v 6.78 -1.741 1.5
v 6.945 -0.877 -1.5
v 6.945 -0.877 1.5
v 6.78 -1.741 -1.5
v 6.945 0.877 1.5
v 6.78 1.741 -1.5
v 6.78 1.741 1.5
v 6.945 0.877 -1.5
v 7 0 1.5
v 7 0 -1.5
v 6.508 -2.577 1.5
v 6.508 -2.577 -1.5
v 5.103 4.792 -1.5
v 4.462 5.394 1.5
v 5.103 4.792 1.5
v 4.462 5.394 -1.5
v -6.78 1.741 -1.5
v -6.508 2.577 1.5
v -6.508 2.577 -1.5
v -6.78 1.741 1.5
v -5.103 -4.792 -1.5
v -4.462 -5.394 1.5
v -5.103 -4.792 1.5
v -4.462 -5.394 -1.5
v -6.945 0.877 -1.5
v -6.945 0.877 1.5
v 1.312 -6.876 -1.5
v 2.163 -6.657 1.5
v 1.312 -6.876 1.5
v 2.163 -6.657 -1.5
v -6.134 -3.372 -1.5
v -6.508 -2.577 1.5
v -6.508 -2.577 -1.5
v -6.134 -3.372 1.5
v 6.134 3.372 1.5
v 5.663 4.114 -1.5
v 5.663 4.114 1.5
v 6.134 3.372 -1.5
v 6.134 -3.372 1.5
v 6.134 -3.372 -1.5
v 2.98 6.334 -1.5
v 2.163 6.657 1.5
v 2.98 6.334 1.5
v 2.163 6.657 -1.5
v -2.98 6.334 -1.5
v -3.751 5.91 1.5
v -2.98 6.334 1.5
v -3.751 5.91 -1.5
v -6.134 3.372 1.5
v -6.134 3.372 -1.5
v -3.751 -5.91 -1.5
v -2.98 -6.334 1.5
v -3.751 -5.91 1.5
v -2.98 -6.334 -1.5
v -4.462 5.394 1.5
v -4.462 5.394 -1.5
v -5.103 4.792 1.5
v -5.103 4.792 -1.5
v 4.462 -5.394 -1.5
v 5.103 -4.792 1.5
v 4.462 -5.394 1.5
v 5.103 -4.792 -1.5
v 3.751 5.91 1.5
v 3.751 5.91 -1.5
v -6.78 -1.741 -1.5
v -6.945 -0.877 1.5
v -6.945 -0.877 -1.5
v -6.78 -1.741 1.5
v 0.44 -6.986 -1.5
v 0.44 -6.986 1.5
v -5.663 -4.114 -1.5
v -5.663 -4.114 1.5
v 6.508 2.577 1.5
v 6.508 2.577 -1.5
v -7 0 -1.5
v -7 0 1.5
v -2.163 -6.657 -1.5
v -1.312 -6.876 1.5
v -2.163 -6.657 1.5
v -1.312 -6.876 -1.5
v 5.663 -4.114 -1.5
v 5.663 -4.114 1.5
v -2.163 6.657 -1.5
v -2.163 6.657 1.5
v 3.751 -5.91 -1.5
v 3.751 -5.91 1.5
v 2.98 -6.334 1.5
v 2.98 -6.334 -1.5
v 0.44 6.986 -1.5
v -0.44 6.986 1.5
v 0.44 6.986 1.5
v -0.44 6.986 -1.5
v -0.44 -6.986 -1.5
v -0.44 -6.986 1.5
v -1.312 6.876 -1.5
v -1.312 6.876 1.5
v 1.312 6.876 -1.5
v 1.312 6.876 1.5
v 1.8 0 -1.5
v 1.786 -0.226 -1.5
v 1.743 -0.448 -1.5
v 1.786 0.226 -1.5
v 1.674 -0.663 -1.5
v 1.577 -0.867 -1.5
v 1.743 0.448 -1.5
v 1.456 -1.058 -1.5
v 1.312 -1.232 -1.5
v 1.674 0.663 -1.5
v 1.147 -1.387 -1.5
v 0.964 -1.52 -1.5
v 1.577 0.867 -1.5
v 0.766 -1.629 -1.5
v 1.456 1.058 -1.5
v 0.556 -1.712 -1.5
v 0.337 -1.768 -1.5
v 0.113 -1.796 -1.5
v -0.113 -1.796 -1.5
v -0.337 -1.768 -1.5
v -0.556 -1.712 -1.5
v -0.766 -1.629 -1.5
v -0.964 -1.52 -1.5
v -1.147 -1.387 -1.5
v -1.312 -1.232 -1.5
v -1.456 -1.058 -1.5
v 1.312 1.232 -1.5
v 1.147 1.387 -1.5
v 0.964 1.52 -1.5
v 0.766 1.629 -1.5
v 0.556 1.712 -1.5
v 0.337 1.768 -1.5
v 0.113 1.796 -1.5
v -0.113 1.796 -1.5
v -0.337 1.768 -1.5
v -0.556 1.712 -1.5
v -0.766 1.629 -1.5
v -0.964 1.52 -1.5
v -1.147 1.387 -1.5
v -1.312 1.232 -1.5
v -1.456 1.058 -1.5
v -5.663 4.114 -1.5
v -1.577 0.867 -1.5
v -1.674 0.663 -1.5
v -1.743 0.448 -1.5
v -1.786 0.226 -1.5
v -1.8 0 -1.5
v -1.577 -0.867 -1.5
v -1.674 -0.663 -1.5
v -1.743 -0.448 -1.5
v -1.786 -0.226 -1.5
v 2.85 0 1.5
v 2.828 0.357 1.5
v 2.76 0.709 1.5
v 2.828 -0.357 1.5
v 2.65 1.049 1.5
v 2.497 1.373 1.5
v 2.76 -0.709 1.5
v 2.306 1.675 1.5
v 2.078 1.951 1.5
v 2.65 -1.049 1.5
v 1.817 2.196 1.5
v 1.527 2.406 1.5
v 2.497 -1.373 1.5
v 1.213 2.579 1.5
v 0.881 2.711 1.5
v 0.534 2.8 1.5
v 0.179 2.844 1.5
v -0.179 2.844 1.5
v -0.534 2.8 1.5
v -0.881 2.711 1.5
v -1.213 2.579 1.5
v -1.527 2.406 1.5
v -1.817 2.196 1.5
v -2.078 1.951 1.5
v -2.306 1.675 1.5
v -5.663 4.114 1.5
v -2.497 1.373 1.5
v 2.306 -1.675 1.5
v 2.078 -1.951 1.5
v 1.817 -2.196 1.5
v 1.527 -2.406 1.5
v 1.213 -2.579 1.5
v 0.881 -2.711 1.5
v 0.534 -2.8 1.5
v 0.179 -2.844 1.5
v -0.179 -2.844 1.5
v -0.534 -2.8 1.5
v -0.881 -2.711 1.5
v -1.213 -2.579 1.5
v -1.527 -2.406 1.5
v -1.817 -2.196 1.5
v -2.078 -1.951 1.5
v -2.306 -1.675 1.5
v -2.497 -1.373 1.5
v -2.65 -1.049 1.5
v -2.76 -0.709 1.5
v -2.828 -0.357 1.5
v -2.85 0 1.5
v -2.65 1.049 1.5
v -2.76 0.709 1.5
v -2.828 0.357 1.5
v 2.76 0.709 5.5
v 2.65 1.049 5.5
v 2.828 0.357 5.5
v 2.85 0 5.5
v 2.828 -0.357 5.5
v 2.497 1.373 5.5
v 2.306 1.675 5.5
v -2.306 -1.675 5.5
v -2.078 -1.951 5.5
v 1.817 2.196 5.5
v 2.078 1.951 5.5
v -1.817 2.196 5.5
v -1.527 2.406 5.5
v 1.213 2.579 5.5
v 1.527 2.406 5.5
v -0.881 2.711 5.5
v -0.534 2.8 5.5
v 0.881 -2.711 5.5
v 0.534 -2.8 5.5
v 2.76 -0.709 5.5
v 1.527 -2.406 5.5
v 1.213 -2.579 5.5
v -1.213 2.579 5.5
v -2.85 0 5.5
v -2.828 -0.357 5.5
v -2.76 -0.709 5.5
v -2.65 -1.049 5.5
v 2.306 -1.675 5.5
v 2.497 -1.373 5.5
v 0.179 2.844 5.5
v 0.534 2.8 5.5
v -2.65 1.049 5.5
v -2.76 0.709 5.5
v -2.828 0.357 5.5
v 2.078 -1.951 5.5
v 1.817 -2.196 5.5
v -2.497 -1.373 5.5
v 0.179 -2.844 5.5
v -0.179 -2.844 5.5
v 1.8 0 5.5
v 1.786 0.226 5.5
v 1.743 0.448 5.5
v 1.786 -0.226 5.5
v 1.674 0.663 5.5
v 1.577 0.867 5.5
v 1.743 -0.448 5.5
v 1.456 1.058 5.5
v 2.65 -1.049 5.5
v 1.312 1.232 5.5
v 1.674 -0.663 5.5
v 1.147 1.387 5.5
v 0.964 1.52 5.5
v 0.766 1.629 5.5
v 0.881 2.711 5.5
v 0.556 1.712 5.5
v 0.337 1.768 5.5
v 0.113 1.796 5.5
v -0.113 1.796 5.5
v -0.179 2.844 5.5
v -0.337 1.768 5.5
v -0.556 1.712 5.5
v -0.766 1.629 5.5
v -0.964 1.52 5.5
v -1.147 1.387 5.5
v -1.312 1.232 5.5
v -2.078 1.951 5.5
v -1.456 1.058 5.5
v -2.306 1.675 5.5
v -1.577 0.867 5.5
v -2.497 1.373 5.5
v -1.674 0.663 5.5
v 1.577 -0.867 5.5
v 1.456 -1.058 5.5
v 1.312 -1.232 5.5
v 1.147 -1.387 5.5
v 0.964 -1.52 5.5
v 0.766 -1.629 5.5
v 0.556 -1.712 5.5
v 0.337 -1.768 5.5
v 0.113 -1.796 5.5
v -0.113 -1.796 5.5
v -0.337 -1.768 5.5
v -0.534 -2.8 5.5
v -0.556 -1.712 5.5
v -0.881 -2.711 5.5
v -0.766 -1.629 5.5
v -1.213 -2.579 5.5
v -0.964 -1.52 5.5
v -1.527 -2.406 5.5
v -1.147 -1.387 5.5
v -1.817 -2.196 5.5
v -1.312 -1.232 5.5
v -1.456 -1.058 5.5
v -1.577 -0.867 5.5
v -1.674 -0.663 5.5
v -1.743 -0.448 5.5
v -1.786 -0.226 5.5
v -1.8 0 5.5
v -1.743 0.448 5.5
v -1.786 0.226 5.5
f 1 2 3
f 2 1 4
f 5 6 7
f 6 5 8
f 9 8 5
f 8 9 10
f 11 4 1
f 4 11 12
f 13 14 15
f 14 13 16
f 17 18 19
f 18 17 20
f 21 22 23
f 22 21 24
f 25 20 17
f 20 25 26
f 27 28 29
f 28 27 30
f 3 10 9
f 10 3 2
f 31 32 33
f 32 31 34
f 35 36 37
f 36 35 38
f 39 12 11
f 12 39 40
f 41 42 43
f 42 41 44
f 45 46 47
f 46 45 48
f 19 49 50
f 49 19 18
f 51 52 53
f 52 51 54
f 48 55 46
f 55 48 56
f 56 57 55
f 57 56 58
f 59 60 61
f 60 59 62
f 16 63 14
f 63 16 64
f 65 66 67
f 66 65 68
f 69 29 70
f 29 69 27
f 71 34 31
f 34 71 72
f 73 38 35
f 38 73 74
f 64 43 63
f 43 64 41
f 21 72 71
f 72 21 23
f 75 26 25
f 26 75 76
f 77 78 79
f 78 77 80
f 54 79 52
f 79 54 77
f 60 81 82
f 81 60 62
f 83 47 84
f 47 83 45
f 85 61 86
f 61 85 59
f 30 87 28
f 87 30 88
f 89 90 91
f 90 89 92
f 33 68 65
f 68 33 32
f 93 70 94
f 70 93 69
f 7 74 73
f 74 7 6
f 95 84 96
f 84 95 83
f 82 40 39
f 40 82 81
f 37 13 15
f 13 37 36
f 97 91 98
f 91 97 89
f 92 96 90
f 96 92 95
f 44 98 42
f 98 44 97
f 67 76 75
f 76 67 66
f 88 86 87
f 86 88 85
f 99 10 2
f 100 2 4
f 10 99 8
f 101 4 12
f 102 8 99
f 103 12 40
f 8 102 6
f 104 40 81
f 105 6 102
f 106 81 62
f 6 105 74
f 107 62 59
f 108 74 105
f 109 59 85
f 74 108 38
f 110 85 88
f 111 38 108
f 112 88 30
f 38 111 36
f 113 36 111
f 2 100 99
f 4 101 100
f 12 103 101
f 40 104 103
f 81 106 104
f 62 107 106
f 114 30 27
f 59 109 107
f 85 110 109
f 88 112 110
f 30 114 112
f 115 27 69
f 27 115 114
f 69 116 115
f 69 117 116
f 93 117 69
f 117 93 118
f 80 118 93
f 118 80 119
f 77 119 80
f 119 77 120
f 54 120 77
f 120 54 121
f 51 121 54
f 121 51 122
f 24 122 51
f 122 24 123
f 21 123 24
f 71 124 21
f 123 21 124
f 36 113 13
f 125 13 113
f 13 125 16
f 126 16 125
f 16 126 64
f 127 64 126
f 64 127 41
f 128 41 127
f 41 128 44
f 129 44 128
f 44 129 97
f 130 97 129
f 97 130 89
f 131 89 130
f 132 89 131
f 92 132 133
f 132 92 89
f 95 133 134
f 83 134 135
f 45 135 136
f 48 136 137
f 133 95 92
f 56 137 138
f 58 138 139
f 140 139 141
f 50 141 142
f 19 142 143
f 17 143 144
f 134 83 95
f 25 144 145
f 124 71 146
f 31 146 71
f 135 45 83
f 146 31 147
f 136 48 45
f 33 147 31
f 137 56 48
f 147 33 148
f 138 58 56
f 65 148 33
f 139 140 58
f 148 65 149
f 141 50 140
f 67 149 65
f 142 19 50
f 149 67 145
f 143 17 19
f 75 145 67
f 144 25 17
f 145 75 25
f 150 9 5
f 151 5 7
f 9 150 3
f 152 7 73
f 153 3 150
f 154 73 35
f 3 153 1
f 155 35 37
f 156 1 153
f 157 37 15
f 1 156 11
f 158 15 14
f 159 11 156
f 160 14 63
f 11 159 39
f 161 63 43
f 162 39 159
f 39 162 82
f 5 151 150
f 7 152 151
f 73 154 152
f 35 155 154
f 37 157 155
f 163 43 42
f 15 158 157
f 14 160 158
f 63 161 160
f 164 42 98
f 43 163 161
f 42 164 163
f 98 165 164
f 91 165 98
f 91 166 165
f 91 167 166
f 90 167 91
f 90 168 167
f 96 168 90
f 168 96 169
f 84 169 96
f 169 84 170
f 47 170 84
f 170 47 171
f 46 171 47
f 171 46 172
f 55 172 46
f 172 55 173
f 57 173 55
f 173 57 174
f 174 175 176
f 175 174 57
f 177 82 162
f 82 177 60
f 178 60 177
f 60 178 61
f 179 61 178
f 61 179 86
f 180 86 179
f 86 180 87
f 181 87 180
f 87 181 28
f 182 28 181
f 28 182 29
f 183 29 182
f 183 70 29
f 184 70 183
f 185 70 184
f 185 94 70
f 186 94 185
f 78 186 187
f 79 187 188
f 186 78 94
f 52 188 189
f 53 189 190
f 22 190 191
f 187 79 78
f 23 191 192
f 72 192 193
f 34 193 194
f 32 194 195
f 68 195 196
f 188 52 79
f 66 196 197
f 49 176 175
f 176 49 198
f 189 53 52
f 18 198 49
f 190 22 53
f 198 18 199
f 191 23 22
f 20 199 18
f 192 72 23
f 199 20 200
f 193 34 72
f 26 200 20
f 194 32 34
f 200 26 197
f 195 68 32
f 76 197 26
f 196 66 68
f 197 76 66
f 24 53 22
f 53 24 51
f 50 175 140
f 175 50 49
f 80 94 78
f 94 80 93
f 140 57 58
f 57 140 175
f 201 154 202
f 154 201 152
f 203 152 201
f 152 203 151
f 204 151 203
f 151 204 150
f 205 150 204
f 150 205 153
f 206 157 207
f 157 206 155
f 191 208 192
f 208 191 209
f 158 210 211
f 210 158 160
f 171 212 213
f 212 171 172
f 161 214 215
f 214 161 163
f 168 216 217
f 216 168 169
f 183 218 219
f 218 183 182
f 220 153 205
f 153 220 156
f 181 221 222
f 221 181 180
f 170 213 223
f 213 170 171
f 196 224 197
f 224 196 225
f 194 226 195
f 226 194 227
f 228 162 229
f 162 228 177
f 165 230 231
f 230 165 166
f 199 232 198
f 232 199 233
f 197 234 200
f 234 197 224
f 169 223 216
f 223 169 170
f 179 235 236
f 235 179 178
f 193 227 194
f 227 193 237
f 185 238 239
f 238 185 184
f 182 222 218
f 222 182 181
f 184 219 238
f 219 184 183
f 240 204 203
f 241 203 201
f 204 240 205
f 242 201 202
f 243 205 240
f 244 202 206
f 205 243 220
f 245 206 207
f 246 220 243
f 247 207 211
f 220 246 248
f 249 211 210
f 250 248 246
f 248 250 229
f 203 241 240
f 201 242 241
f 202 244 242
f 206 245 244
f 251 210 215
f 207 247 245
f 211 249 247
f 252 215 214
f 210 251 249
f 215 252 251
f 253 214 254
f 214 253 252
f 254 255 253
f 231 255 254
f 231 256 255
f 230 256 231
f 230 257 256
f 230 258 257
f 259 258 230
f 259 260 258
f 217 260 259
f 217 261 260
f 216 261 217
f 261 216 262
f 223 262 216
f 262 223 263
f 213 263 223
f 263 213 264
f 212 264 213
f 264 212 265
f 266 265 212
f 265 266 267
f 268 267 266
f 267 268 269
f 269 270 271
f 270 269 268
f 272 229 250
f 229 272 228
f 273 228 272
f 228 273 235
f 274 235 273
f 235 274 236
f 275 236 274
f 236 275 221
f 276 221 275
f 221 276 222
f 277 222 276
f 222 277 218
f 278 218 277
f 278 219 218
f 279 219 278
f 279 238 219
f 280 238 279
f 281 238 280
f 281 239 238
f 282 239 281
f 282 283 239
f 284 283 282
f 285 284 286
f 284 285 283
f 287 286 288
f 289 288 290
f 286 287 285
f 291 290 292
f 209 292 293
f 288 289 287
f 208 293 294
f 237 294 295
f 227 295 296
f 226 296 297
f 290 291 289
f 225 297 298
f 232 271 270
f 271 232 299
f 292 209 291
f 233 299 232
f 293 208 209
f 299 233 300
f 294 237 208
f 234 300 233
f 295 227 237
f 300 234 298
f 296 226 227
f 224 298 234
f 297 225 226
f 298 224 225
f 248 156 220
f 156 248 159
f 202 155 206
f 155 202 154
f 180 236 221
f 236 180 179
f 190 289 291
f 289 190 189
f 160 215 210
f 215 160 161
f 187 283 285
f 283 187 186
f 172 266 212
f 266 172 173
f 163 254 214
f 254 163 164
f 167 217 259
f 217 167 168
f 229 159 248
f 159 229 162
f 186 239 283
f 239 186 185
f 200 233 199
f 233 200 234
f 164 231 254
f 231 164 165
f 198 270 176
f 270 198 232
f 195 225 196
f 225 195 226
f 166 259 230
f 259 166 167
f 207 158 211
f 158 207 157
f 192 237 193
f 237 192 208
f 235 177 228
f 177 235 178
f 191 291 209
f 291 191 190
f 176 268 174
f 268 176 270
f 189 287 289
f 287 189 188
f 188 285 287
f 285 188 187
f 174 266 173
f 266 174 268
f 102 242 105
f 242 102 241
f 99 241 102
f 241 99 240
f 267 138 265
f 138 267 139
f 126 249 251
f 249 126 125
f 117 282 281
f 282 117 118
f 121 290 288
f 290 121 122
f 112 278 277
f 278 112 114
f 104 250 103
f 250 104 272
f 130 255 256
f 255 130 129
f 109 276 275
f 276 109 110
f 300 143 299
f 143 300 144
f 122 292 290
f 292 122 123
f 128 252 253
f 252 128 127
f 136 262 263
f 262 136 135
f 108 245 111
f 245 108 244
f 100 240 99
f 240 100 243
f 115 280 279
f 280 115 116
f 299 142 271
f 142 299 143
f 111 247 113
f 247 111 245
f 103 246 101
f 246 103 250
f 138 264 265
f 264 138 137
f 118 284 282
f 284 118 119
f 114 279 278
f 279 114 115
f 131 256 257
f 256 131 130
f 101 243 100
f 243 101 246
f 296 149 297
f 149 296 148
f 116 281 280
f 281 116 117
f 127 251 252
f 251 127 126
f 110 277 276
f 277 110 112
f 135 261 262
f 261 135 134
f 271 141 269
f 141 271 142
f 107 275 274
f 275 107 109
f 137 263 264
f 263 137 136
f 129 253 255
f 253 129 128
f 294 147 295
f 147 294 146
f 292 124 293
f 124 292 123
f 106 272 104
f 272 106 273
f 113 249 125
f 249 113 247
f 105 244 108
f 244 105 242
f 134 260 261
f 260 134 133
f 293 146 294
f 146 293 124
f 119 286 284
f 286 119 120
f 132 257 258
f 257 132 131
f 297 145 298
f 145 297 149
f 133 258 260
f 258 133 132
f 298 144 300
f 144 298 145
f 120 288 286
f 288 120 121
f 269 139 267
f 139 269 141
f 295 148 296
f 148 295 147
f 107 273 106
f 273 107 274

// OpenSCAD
$fn = 50;


difference() {
	union() {
		translate(v = [0, 0, -1.5000000000]) {
			cylinder(h = 3, r = 7.0000000000);
		}
		translate(v = [0, 0, -1.5000000000]) {
			cylinder(h = 7, r = 2.8500000000);
		}
	}
	union() {
		translate(v = [0, 0, -50.0000000000]) {
			cylinder(h = 100, r = 1.8000000000);
		}
	}
}
